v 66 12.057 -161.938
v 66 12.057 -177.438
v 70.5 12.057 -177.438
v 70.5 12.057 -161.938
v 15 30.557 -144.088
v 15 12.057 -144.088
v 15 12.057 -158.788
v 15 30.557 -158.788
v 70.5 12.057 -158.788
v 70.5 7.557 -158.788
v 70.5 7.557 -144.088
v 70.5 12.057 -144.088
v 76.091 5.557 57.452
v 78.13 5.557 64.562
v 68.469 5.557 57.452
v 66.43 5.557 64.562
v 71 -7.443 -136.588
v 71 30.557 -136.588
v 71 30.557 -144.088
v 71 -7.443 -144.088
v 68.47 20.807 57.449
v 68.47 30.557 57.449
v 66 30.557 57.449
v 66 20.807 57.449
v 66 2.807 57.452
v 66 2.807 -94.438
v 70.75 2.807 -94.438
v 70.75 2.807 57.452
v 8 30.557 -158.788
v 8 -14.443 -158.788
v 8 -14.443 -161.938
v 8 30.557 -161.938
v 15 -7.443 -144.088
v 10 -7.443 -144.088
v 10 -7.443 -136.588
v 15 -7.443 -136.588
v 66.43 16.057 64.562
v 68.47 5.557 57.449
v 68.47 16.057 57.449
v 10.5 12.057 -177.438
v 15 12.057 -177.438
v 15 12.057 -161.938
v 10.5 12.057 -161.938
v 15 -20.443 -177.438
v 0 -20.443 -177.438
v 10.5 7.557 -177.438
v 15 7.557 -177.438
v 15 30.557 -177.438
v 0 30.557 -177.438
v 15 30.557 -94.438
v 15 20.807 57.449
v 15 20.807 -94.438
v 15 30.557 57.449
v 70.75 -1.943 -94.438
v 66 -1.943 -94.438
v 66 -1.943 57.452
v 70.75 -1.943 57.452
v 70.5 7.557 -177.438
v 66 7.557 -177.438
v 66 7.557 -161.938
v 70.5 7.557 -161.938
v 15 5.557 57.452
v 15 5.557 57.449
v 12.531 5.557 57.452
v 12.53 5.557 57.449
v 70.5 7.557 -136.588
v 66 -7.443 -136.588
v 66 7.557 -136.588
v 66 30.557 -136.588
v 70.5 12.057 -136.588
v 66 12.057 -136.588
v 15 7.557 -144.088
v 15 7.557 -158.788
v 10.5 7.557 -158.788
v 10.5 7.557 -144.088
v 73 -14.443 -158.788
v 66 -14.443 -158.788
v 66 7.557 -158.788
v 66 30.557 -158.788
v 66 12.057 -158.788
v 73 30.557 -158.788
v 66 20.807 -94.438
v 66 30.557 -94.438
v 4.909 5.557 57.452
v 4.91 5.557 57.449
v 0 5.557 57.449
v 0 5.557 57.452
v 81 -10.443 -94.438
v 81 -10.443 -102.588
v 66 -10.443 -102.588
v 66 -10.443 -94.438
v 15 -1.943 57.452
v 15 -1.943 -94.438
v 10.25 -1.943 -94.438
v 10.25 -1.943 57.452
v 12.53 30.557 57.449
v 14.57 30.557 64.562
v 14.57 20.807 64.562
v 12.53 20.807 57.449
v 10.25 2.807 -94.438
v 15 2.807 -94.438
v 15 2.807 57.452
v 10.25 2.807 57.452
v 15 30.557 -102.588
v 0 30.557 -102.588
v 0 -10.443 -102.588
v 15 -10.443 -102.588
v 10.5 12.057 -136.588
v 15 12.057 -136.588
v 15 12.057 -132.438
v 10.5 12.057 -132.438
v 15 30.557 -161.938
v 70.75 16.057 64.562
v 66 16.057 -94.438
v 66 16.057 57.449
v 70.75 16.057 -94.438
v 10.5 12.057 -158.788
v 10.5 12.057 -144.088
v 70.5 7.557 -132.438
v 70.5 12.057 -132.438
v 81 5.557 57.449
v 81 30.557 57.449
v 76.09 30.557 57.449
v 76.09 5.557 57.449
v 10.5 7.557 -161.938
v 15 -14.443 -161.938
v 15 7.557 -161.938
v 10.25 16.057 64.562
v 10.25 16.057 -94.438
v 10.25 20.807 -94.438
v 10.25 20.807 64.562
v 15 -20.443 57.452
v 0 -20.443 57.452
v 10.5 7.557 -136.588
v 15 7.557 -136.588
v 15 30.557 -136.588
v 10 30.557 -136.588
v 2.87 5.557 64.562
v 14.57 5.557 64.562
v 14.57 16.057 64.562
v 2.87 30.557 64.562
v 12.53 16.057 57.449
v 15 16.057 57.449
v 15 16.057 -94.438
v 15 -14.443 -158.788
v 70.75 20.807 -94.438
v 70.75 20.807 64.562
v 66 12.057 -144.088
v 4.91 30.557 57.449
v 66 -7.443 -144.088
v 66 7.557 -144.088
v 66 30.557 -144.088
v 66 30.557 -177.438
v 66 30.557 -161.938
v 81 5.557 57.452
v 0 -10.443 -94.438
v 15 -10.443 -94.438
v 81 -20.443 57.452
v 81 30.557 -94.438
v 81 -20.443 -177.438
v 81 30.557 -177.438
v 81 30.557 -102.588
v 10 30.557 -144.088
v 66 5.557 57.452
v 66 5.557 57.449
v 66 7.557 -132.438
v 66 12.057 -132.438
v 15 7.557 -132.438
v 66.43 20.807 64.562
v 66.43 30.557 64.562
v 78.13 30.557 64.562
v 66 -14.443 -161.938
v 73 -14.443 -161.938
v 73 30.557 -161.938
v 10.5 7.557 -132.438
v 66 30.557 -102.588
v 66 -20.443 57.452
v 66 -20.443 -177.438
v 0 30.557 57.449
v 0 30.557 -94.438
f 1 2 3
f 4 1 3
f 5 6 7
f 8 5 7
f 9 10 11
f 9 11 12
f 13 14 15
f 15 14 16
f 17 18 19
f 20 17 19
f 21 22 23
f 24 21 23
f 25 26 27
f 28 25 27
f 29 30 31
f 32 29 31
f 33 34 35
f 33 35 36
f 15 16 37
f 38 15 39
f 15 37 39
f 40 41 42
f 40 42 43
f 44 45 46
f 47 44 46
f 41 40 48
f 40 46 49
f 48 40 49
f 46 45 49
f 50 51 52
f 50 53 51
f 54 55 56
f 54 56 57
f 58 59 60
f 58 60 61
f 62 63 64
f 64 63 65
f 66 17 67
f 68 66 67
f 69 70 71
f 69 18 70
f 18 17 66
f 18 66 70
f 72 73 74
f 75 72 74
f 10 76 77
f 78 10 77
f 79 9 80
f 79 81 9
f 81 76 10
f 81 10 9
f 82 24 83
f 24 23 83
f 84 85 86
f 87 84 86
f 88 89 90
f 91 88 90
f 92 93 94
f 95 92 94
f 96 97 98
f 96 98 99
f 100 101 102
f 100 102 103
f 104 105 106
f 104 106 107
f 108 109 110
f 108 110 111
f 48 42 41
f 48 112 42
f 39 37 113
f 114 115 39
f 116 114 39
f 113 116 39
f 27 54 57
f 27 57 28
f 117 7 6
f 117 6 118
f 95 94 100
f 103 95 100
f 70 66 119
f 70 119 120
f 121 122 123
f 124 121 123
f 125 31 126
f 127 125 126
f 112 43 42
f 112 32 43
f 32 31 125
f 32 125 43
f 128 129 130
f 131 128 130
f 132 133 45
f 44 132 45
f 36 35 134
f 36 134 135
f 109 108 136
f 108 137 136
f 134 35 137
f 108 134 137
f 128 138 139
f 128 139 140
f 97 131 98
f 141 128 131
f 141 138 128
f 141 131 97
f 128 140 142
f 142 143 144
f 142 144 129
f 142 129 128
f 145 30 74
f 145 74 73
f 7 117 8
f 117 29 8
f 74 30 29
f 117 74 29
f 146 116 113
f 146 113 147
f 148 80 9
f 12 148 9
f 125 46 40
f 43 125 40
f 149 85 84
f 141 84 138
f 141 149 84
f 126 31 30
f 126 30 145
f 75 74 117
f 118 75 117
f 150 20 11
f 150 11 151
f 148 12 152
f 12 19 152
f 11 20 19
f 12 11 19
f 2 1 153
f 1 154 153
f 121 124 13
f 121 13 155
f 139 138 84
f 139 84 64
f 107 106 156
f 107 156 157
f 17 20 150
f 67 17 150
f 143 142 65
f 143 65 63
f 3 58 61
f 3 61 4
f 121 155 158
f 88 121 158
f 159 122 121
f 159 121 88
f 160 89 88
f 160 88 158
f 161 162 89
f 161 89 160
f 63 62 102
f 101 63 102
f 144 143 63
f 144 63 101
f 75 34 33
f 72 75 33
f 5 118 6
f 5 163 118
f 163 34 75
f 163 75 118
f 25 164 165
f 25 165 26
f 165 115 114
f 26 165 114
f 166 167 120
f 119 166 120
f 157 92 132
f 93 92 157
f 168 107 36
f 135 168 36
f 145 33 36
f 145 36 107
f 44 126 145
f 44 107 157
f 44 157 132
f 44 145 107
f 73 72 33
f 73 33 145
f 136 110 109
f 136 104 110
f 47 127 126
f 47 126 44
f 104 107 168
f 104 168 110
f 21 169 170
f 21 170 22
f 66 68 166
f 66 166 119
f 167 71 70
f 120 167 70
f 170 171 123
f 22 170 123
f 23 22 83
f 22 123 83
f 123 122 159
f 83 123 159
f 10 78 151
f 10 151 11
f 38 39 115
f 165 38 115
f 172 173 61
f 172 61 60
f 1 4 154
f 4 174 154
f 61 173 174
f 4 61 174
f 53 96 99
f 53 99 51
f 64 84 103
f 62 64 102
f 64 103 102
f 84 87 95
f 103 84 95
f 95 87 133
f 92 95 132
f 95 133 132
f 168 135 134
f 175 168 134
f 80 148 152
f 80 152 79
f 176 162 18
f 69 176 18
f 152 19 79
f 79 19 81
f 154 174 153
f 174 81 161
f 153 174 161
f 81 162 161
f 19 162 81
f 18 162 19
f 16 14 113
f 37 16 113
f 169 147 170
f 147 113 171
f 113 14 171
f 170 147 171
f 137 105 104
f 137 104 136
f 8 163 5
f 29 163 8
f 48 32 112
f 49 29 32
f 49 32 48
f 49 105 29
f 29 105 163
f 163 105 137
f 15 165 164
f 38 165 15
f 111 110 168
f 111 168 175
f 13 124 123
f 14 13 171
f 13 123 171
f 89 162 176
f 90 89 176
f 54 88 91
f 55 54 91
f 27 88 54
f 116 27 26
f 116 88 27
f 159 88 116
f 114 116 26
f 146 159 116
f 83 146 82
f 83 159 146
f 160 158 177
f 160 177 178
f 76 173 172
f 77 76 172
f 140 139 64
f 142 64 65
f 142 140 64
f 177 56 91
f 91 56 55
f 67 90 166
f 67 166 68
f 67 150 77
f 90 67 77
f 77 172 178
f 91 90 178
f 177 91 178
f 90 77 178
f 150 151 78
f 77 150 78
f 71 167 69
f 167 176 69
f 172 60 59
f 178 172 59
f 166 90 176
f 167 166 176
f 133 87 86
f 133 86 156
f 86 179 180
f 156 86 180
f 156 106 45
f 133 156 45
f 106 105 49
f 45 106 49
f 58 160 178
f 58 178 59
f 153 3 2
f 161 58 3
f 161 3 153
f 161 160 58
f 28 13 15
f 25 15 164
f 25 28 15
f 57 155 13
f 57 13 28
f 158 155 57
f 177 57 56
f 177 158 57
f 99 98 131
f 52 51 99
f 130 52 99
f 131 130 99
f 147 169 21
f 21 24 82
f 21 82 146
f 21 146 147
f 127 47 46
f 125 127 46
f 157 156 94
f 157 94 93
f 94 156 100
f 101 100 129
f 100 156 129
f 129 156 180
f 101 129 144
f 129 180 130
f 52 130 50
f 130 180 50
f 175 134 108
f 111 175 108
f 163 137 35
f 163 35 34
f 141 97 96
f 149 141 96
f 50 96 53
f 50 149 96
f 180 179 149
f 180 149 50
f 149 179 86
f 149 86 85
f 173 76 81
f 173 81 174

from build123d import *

# Parameters (mm, degrees)
SKETCH1_W           = 242
SKETCH1_H           = 51
BOSS_EXTRUDE1_DEPTH = 15
CUT_EXTRUDE8_DEPTH  = 25
SKETCH13_W          = 15
SKETCH13_H          = 7.11
CUT_EXTRUDE9_DEPTH  = 26
SKETCH17_W          = 15
SKETCH17_H          = 8.15
CUT_EXTRUDE10_DEPTH = 41
SKETCH7_W           = 4.75
SKETCH7_H           = 4.75
CUT_EXTRUDE5_DEPTH  = 165
SKETCH22_W          = 7
SKETCH22_H          = 3.15
CUT_EXTRUDE13_DEPTH = 45
SKETCH18_W          = 5
SKETCH18_H          = 7.5
CUT_EXTRUDE11_DEPTH = 38
SKETCH23_W          = 4.5
SKETCH23_H          = 4.5
CUT_EXTRUDE14_DEPTH = 45


with BuildPart() as part:
    # Sketch1 → Boss-Extrude1 (new body)
    with BuildSketch(Plane(origin=(0, 0, 0), x_dir=(0, 0, -1), z_dir=(1, 0, 0))):
        with Locations((56.437921078, 5.057266603)):
            Rectangle(SKETCH1_W, SKETCH1_H)
    extrude(amount=BOSS_EXTRUDE1_DEPTH)

    # Sketch12 → Cut-Extrude8 (cut)
    with BuildSketch(Plane(origin=(0, 30.557266603, 0), x_dir=(1, 0, 0), z_dir=(0, 1, 0))):
        Polygon((0, -57.448742372), (4.909716433, -57.448742372), (2.87, -64.562078922), (0, -64.562078922), align=None)
        Polygon((15, -57.448742372), (15, -64.562078922), (14.57, -64.562078922), (12.530283567, -57.448742372), align=None)
    extrude(amount=-CUT_EXTRUDE8_DEPTH, mode=Mode.SUBTRACT)

    # Sketch13 → Cut-Extrude9 (cut)
    with BuildSketch(Plane.XZ.offset(20.442733397)):
        with Locations((7.5, 61.007078922)):
            Rectangle(SKETCH13_W, SKETCH13_H)
    extrude(amount=-CUT_EXTRUDE9_DEPTH, mode=Mode.SUBTRACT)

    # Sketch17 → Cut-Extrude10 (cut)
    with BuildSketch(Plane(origin=(0, 30.557266603, 0), x_dir=(1, 0, 0), z_dir=(0, 1, 0))):
        with Locations((7.5, 98.512921078)):
            Rectangle(SKETCH17_W, SKETCH17_H)
    extrude(amount=-CUT_EXTRUDE10_DEPTH, mode=Mode.SUBTRACT)

    # Sketch7 → Cut-Extrude5 (cut)
    with BuildSketch(Plane(origin=(0, 0, -94.437921078), x_dir=(-1, 0, 0), z_dir=(0, 0, -1))):
        with Locations((-12.625, 0.432266603)):
            Rectangle(SKETCH7_W, SKETCH7_H)
        with Locations((-12.625, 18.432266603)):
            Rectangle(SKETCH7_W, SKETCH7_H)
    extrude(amount=-CUT_EXTRUDE5_DEPTH, mode=Mode.SUBTRACT)

    # Sketch22 → Cut-Extrude13 (cut)
    with BuildSketch(Plane(origin=(0, 30.557266603, 0), x_dir=(1, 0, 0), z_dir=(0, 1, 0))):
        with Locations((11.5, 160.362921078)):
            Rectangle(SKETCH22_W, SKETCH22_H)
    extrude(amount=-CUT_EXTRUDE13_DEPTH, mode=Mode.SUBTRACT)

    # Sketch18 → Cut-Extrude11 (cut)
    with BuildSketch(Plane(origin=(0, 30.557266603, 0), x_dir=(1, 0, 0), z_dir=(0, 1, 0))):
        with Locations((12.5, 140.337921078)):
            Rectangle(SKETCH18_W, SKETCH18_H)
    extrude(amount=-CUT_EXTRUDE11_DEPTH, mode=Mode.SUBTRACT)

    # Sketch23 → Cut-Extrude14 (cut)
    with BuildSketch(Plane(origin=(0, 0, -177.437921078), x_dir=(-1, 0, 0), z_dir=(0, 0, -1))):
        with Locations((-12.75, 9.807266603)):
            Rectangle(SKETCH23_W, SKETCH23_H)
    extrude(amount=-CUT_EXTRUDE14_DEPTH, mode=Mode.SUBTRACT)


with BuildPart() as body_2:
    # Mirror4: mirrored copy
    add(part.part.mirror(Plane(origin=(40.5, 0, 0), x_dir=(0, 0, 1), z_dir=(1, 0, 0))))


solid = Compound([part.part, body_2.part])
